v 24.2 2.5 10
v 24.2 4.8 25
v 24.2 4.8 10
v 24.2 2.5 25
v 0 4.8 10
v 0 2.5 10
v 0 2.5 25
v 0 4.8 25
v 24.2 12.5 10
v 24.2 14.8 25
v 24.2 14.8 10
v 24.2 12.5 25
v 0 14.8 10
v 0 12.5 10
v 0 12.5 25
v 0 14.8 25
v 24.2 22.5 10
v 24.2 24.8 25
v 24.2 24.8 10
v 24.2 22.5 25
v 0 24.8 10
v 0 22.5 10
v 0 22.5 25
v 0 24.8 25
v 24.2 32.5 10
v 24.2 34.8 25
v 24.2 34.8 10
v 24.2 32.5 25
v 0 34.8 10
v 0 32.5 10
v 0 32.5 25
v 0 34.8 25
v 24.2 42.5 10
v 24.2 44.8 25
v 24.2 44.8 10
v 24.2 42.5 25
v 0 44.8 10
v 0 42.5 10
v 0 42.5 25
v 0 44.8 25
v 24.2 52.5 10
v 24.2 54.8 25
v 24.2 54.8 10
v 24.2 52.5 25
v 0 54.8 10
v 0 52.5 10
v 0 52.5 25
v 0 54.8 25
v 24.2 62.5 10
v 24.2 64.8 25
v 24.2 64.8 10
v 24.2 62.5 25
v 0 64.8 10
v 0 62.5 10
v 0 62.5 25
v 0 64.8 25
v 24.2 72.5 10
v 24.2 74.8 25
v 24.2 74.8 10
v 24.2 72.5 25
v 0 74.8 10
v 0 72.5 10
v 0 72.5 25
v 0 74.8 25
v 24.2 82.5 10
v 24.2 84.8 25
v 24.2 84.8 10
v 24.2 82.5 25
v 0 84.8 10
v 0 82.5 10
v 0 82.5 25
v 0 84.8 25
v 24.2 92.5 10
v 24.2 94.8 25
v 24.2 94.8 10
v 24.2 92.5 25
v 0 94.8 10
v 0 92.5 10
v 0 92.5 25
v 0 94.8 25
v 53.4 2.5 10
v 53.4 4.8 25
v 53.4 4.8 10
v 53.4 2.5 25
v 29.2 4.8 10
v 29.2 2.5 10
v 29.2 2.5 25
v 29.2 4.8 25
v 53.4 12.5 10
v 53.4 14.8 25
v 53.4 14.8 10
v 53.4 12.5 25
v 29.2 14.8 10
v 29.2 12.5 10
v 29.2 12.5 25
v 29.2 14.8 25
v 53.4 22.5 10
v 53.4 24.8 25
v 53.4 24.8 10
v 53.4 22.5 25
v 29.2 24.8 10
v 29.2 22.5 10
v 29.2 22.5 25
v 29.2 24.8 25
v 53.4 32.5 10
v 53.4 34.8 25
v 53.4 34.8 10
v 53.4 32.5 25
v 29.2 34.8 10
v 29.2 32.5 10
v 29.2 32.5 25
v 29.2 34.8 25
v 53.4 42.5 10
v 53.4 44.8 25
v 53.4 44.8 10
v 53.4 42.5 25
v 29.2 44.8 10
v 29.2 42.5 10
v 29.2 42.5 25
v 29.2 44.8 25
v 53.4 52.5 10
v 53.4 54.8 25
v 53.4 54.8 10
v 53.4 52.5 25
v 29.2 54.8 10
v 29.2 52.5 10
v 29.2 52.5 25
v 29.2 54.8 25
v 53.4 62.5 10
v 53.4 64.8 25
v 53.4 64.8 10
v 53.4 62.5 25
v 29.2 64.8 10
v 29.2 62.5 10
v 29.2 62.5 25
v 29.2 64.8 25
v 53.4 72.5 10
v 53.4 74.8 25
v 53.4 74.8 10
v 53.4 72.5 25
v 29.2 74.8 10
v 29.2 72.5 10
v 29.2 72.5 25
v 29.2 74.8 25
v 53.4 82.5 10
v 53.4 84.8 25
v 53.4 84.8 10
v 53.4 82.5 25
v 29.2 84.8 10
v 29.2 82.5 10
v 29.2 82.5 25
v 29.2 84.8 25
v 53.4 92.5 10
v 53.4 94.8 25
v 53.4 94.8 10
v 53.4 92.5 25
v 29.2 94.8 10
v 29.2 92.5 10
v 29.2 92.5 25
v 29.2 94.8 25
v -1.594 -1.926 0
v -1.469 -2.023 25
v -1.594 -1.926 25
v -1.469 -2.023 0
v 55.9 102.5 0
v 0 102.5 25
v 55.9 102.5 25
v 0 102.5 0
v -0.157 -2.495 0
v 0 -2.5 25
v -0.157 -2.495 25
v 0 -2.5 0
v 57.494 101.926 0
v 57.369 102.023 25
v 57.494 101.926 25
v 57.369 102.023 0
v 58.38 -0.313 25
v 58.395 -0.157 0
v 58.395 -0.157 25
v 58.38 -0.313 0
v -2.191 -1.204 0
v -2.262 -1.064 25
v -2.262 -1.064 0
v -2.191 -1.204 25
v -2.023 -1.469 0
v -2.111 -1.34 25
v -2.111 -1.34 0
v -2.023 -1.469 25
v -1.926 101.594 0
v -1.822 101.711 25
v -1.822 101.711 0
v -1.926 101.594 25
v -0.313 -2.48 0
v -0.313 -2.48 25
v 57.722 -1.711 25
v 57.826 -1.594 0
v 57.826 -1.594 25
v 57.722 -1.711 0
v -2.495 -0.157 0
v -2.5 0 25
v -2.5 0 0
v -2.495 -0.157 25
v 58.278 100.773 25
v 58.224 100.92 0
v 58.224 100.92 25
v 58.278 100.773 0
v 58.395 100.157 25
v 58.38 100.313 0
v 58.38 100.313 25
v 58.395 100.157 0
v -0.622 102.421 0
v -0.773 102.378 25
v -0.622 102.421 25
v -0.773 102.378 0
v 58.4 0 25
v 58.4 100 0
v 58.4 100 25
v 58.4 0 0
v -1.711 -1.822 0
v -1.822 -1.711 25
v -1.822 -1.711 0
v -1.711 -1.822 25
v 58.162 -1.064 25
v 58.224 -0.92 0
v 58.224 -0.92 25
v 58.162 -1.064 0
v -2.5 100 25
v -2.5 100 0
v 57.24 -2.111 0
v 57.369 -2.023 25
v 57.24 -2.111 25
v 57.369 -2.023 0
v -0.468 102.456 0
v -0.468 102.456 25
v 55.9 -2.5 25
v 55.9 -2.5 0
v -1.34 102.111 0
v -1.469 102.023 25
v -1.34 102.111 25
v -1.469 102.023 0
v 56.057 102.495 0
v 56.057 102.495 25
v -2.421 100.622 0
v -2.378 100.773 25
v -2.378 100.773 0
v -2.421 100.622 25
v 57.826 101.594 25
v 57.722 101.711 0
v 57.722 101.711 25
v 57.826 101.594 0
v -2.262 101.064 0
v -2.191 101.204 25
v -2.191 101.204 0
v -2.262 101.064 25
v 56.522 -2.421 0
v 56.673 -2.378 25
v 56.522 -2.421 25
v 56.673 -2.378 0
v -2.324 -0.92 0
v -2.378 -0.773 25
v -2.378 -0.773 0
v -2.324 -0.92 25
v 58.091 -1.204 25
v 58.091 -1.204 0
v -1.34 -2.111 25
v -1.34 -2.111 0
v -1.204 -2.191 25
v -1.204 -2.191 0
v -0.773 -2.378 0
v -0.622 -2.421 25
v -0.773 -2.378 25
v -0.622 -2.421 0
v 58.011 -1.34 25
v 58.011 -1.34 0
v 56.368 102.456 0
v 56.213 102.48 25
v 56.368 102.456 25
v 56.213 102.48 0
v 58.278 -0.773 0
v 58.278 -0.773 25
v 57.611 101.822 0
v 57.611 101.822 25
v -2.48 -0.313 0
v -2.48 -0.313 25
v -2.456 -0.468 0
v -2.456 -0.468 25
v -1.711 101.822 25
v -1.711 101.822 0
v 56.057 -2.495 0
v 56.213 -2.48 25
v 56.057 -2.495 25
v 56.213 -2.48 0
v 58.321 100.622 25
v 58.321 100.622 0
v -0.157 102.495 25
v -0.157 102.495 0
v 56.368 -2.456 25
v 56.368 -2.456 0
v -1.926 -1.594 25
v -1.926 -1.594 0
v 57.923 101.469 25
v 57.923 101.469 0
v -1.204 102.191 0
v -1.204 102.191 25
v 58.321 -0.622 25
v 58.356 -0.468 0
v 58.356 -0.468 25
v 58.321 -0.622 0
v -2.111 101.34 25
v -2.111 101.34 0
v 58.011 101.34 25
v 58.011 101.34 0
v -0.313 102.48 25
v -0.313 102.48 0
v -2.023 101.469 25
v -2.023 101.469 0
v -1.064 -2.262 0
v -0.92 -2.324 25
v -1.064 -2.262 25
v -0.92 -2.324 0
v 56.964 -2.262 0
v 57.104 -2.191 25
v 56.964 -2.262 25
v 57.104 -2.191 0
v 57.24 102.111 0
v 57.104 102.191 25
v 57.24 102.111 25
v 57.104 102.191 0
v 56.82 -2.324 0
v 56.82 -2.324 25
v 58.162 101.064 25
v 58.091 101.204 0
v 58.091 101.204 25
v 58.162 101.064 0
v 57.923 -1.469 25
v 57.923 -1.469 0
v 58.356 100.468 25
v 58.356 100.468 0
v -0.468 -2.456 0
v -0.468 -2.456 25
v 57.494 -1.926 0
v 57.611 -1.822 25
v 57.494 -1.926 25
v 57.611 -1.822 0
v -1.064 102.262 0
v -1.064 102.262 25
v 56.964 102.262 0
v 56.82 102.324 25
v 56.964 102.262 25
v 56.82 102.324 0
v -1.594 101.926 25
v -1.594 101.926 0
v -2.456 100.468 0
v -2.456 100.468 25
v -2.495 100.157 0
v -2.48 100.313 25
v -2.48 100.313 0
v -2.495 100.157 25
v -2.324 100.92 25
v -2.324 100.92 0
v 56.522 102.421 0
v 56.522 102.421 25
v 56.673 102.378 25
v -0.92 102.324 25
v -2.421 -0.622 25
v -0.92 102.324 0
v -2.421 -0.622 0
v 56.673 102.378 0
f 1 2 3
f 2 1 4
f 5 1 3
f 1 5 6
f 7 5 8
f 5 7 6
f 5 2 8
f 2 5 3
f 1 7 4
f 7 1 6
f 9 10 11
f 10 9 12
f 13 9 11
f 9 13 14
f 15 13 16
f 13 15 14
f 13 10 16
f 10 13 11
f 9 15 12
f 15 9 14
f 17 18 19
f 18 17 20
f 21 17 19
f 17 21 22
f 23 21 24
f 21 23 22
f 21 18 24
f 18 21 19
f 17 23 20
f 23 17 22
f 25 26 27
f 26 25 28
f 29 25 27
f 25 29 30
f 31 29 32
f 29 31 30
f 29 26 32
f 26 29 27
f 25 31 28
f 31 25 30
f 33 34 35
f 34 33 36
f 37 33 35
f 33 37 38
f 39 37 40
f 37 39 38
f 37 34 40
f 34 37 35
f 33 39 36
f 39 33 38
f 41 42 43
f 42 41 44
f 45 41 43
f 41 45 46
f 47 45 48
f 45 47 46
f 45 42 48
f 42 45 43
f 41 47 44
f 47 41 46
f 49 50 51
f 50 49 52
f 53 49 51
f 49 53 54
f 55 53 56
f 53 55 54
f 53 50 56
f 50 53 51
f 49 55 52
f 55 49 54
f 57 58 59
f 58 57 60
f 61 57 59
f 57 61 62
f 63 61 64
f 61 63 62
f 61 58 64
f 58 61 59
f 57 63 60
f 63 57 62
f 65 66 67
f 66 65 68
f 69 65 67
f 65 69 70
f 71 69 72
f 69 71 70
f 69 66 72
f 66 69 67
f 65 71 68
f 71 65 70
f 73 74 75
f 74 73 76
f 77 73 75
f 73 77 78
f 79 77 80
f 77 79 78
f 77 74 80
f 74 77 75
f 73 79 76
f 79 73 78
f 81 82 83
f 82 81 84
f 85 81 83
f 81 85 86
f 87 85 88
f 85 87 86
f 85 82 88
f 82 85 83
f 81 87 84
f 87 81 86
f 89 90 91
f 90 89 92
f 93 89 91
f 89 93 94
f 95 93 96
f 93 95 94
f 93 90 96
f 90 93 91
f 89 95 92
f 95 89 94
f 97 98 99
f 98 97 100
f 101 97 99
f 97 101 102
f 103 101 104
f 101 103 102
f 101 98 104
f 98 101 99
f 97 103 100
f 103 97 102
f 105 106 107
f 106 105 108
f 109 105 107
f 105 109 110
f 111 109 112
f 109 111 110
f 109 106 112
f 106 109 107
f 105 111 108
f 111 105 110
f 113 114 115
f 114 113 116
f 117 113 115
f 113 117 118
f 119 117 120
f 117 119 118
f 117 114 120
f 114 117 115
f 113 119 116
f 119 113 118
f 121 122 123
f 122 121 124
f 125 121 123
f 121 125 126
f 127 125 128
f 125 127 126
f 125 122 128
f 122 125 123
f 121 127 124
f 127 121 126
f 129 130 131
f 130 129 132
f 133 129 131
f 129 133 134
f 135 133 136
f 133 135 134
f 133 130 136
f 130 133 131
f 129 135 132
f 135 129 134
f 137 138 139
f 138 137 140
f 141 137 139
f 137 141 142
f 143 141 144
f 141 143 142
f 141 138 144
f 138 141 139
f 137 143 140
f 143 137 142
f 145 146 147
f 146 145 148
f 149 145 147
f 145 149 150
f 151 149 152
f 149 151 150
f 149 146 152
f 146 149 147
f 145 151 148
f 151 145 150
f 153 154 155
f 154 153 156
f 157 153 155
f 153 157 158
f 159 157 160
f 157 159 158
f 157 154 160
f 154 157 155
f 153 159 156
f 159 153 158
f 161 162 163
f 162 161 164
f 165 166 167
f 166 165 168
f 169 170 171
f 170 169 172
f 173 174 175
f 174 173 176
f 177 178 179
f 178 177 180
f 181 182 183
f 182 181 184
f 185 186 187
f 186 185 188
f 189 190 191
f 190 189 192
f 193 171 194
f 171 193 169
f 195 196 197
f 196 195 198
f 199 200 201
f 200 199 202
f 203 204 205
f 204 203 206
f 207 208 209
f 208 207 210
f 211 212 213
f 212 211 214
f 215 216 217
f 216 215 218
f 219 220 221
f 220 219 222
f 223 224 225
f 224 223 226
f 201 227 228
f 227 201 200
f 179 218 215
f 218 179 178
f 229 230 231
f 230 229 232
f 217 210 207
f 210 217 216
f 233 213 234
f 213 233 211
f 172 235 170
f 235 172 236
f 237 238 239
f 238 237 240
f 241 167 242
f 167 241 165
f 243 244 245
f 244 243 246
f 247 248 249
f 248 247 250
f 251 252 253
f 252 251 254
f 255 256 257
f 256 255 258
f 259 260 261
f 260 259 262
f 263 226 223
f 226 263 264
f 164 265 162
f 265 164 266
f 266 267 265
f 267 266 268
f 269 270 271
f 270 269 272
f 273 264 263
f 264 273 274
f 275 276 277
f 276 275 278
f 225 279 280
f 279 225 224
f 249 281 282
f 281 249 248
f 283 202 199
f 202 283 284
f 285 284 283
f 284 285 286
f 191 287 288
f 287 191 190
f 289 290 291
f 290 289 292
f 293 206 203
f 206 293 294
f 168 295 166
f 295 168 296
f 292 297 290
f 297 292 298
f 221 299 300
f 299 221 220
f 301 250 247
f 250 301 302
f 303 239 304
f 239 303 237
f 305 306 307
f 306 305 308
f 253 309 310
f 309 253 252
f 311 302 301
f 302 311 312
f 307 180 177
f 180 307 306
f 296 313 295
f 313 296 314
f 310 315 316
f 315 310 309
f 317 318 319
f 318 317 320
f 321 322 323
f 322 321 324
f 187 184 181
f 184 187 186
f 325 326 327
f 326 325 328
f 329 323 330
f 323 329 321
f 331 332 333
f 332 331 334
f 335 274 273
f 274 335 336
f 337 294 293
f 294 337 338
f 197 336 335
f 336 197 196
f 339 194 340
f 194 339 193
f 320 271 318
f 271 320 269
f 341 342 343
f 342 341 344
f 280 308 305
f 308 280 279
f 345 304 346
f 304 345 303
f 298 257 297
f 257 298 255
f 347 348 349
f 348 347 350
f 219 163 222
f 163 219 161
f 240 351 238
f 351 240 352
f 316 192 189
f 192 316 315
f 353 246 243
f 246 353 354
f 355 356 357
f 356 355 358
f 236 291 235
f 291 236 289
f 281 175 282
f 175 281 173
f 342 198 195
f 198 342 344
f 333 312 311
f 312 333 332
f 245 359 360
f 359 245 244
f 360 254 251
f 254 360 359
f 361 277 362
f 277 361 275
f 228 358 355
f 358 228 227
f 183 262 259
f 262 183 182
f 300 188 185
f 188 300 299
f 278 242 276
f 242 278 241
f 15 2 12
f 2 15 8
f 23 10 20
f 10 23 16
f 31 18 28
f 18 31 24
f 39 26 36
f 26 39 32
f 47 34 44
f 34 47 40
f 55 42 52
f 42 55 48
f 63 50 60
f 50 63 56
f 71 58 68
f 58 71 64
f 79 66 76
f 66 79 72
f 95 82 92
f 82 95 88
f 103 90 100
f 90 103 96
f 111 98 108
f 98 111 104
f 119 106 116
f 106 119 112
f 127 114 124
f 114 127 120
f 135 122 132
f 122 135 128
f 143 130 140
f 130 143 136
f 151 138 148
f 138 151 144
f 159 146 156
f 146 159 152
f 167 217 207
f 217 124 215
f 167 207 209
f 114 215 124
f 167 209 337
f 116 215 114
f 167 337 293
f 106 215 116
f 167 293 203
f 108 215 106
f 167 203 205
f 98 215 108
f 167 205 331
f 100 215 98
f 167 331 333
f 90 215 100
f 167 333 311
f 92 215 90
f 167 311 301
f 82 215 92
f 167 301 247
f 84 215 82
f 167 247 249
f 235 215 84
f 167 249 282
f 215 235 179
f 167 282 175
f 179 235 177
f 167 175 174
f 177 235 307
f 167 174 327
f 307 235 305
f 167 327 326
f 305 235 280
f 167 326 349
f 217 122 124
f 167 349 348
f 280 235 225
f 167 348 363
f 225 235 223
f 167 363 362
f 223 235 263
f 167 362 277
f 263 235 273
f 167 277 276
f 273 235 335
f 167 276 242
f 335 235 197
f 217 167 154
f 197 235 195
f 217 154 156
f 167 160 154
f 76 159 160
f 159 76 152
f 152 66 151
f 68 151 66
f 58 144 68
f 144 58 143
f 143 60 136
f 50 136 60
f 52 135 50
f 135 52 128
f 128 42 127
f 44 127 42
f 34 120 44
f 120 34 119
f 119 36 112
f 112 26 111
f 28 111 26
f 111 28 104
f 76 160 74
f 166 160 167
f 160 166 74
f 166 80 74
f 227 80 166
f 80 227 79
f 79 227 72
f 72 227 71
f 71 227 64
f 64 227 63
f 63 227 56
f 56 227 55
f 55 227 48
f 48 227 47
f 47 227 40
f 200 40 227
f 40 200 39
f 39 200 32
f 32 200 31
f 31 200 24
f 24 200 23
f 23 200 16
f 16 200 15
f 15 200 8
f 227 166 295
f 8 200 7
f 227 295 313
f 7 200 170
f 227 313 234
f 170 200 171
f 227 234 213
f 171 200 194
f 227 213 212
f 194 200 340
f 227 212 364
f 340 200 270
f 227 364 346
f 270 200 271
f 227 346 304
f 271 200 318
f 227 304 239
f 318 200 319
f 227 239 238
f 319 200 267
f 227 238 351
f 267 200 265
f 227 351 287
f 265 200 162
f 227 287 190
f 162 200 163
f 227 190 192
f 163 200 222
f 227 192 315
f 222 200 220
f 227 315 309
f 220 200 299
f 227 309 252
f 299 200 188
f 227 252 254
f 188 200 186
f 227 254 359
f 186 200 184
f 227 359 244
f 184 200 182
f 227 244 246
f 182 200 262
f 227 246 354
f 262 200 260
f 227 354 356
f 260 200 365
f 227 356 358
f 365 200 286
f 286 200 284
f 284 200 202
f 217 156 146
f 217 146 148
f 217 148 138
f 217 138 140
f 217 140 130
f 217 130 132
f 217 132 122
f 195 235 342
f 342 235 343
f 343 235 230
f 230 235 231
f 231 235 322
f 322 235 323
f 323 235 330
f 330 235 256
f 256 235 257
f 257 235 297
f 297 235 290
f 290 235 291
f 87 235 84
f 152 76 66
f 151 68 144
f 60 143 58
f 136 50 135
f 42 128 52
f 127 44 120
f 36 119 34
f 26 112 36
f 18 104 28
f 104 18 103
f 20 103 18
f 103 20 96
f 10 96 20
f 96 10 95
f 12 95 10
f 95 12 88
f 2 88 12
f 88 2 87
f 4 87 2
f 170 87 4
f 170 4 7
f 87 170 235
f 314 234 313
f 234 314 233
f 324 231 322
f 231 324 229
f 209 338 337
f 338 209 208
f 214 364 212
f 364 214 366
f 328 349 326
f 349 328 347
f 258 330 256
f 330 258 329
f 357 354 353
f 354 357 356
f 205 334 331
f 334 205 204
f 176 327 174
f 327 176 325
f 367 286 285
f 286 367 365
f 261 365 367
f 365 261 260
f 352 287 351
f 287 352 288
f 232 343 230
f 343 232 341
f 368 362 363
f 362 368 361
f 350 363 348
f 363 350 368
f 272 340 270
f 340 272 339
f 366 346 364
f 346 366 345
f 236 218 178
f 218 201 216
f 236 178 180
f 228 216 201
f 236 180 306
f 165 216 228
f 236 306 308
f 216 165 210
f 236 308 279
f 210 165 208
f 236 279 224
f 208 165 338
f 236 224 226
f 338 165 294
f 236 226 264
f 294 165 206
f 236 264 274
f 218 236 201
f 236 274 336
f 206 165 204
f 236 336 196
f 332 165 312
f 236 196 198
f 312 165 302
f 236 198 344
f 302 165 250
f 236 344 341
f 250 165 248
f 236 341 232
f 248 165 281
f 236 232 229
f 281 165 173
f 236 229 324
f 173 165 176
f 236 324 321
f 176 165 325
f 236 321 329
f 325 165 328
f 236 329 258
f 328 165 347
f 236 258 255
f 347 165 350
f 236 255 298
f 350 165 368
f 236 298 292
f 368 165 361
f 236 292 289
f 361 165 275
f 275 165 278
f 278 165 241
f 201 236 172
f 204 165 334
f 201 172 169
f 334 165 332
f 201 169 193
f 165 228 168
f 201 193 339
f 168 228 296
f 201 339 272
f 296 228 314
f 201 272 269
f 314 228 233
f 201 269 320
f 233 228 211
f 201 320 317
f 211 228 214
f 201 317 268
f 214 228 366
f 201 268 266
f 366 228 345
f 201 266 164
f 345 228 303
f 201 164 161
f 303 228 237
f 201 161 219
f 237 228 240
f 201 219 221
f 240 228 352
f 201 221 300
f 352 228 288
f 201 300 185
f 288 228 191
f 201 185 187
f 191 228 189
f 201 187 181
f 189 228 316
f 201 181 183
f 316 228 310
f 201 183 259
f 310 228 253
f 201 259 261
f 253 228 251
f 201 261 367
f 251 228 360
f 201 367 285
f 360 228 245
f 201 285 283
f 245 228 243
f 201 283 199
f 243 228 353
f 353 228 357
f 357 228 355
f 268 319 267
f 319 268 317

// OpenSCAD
/*
copyright 2016 überhack

Customizable SD card holder by uberhack is licensed under the Attribution - Non-Commercial - Share Alike license.

Have fun =)
*/

rows = 2;
cols = 10;
height = 25;
radius = 2.5;
tolerance = 0.2;

$fn=100/1;

// card size 32.0 × 24.0 × 2.1 mm
sd_card_holder();


module sd_card_holder(){
cardx = 24;
cardy = 2.1;
cardz = 32;

    difference(){
        hull(){
            cylinder(r=radius, h=height);
            translate([0,cols*10,0])
            cylinder(r=radius, h=height);
            translate([rows*(radius*2+cardx+tolerance)-radius,cols*10,0])
            cylinder(r=radius, h=height);
            translate([rows*(radius*2+cardx+tolerance)-radius,0,0])
            cylinder(r=radius, h=height);
        }

        for (r = [0:1:rows-1]){
            for (c = [0:1:cols-1]){
                translate([r*(radius*2+cardx+tolerance),radius+(c*10),10])
                cube([cardx+tolerance,cardy+tolerance,cardz+tolerance]);
            }
        }
    }
}
